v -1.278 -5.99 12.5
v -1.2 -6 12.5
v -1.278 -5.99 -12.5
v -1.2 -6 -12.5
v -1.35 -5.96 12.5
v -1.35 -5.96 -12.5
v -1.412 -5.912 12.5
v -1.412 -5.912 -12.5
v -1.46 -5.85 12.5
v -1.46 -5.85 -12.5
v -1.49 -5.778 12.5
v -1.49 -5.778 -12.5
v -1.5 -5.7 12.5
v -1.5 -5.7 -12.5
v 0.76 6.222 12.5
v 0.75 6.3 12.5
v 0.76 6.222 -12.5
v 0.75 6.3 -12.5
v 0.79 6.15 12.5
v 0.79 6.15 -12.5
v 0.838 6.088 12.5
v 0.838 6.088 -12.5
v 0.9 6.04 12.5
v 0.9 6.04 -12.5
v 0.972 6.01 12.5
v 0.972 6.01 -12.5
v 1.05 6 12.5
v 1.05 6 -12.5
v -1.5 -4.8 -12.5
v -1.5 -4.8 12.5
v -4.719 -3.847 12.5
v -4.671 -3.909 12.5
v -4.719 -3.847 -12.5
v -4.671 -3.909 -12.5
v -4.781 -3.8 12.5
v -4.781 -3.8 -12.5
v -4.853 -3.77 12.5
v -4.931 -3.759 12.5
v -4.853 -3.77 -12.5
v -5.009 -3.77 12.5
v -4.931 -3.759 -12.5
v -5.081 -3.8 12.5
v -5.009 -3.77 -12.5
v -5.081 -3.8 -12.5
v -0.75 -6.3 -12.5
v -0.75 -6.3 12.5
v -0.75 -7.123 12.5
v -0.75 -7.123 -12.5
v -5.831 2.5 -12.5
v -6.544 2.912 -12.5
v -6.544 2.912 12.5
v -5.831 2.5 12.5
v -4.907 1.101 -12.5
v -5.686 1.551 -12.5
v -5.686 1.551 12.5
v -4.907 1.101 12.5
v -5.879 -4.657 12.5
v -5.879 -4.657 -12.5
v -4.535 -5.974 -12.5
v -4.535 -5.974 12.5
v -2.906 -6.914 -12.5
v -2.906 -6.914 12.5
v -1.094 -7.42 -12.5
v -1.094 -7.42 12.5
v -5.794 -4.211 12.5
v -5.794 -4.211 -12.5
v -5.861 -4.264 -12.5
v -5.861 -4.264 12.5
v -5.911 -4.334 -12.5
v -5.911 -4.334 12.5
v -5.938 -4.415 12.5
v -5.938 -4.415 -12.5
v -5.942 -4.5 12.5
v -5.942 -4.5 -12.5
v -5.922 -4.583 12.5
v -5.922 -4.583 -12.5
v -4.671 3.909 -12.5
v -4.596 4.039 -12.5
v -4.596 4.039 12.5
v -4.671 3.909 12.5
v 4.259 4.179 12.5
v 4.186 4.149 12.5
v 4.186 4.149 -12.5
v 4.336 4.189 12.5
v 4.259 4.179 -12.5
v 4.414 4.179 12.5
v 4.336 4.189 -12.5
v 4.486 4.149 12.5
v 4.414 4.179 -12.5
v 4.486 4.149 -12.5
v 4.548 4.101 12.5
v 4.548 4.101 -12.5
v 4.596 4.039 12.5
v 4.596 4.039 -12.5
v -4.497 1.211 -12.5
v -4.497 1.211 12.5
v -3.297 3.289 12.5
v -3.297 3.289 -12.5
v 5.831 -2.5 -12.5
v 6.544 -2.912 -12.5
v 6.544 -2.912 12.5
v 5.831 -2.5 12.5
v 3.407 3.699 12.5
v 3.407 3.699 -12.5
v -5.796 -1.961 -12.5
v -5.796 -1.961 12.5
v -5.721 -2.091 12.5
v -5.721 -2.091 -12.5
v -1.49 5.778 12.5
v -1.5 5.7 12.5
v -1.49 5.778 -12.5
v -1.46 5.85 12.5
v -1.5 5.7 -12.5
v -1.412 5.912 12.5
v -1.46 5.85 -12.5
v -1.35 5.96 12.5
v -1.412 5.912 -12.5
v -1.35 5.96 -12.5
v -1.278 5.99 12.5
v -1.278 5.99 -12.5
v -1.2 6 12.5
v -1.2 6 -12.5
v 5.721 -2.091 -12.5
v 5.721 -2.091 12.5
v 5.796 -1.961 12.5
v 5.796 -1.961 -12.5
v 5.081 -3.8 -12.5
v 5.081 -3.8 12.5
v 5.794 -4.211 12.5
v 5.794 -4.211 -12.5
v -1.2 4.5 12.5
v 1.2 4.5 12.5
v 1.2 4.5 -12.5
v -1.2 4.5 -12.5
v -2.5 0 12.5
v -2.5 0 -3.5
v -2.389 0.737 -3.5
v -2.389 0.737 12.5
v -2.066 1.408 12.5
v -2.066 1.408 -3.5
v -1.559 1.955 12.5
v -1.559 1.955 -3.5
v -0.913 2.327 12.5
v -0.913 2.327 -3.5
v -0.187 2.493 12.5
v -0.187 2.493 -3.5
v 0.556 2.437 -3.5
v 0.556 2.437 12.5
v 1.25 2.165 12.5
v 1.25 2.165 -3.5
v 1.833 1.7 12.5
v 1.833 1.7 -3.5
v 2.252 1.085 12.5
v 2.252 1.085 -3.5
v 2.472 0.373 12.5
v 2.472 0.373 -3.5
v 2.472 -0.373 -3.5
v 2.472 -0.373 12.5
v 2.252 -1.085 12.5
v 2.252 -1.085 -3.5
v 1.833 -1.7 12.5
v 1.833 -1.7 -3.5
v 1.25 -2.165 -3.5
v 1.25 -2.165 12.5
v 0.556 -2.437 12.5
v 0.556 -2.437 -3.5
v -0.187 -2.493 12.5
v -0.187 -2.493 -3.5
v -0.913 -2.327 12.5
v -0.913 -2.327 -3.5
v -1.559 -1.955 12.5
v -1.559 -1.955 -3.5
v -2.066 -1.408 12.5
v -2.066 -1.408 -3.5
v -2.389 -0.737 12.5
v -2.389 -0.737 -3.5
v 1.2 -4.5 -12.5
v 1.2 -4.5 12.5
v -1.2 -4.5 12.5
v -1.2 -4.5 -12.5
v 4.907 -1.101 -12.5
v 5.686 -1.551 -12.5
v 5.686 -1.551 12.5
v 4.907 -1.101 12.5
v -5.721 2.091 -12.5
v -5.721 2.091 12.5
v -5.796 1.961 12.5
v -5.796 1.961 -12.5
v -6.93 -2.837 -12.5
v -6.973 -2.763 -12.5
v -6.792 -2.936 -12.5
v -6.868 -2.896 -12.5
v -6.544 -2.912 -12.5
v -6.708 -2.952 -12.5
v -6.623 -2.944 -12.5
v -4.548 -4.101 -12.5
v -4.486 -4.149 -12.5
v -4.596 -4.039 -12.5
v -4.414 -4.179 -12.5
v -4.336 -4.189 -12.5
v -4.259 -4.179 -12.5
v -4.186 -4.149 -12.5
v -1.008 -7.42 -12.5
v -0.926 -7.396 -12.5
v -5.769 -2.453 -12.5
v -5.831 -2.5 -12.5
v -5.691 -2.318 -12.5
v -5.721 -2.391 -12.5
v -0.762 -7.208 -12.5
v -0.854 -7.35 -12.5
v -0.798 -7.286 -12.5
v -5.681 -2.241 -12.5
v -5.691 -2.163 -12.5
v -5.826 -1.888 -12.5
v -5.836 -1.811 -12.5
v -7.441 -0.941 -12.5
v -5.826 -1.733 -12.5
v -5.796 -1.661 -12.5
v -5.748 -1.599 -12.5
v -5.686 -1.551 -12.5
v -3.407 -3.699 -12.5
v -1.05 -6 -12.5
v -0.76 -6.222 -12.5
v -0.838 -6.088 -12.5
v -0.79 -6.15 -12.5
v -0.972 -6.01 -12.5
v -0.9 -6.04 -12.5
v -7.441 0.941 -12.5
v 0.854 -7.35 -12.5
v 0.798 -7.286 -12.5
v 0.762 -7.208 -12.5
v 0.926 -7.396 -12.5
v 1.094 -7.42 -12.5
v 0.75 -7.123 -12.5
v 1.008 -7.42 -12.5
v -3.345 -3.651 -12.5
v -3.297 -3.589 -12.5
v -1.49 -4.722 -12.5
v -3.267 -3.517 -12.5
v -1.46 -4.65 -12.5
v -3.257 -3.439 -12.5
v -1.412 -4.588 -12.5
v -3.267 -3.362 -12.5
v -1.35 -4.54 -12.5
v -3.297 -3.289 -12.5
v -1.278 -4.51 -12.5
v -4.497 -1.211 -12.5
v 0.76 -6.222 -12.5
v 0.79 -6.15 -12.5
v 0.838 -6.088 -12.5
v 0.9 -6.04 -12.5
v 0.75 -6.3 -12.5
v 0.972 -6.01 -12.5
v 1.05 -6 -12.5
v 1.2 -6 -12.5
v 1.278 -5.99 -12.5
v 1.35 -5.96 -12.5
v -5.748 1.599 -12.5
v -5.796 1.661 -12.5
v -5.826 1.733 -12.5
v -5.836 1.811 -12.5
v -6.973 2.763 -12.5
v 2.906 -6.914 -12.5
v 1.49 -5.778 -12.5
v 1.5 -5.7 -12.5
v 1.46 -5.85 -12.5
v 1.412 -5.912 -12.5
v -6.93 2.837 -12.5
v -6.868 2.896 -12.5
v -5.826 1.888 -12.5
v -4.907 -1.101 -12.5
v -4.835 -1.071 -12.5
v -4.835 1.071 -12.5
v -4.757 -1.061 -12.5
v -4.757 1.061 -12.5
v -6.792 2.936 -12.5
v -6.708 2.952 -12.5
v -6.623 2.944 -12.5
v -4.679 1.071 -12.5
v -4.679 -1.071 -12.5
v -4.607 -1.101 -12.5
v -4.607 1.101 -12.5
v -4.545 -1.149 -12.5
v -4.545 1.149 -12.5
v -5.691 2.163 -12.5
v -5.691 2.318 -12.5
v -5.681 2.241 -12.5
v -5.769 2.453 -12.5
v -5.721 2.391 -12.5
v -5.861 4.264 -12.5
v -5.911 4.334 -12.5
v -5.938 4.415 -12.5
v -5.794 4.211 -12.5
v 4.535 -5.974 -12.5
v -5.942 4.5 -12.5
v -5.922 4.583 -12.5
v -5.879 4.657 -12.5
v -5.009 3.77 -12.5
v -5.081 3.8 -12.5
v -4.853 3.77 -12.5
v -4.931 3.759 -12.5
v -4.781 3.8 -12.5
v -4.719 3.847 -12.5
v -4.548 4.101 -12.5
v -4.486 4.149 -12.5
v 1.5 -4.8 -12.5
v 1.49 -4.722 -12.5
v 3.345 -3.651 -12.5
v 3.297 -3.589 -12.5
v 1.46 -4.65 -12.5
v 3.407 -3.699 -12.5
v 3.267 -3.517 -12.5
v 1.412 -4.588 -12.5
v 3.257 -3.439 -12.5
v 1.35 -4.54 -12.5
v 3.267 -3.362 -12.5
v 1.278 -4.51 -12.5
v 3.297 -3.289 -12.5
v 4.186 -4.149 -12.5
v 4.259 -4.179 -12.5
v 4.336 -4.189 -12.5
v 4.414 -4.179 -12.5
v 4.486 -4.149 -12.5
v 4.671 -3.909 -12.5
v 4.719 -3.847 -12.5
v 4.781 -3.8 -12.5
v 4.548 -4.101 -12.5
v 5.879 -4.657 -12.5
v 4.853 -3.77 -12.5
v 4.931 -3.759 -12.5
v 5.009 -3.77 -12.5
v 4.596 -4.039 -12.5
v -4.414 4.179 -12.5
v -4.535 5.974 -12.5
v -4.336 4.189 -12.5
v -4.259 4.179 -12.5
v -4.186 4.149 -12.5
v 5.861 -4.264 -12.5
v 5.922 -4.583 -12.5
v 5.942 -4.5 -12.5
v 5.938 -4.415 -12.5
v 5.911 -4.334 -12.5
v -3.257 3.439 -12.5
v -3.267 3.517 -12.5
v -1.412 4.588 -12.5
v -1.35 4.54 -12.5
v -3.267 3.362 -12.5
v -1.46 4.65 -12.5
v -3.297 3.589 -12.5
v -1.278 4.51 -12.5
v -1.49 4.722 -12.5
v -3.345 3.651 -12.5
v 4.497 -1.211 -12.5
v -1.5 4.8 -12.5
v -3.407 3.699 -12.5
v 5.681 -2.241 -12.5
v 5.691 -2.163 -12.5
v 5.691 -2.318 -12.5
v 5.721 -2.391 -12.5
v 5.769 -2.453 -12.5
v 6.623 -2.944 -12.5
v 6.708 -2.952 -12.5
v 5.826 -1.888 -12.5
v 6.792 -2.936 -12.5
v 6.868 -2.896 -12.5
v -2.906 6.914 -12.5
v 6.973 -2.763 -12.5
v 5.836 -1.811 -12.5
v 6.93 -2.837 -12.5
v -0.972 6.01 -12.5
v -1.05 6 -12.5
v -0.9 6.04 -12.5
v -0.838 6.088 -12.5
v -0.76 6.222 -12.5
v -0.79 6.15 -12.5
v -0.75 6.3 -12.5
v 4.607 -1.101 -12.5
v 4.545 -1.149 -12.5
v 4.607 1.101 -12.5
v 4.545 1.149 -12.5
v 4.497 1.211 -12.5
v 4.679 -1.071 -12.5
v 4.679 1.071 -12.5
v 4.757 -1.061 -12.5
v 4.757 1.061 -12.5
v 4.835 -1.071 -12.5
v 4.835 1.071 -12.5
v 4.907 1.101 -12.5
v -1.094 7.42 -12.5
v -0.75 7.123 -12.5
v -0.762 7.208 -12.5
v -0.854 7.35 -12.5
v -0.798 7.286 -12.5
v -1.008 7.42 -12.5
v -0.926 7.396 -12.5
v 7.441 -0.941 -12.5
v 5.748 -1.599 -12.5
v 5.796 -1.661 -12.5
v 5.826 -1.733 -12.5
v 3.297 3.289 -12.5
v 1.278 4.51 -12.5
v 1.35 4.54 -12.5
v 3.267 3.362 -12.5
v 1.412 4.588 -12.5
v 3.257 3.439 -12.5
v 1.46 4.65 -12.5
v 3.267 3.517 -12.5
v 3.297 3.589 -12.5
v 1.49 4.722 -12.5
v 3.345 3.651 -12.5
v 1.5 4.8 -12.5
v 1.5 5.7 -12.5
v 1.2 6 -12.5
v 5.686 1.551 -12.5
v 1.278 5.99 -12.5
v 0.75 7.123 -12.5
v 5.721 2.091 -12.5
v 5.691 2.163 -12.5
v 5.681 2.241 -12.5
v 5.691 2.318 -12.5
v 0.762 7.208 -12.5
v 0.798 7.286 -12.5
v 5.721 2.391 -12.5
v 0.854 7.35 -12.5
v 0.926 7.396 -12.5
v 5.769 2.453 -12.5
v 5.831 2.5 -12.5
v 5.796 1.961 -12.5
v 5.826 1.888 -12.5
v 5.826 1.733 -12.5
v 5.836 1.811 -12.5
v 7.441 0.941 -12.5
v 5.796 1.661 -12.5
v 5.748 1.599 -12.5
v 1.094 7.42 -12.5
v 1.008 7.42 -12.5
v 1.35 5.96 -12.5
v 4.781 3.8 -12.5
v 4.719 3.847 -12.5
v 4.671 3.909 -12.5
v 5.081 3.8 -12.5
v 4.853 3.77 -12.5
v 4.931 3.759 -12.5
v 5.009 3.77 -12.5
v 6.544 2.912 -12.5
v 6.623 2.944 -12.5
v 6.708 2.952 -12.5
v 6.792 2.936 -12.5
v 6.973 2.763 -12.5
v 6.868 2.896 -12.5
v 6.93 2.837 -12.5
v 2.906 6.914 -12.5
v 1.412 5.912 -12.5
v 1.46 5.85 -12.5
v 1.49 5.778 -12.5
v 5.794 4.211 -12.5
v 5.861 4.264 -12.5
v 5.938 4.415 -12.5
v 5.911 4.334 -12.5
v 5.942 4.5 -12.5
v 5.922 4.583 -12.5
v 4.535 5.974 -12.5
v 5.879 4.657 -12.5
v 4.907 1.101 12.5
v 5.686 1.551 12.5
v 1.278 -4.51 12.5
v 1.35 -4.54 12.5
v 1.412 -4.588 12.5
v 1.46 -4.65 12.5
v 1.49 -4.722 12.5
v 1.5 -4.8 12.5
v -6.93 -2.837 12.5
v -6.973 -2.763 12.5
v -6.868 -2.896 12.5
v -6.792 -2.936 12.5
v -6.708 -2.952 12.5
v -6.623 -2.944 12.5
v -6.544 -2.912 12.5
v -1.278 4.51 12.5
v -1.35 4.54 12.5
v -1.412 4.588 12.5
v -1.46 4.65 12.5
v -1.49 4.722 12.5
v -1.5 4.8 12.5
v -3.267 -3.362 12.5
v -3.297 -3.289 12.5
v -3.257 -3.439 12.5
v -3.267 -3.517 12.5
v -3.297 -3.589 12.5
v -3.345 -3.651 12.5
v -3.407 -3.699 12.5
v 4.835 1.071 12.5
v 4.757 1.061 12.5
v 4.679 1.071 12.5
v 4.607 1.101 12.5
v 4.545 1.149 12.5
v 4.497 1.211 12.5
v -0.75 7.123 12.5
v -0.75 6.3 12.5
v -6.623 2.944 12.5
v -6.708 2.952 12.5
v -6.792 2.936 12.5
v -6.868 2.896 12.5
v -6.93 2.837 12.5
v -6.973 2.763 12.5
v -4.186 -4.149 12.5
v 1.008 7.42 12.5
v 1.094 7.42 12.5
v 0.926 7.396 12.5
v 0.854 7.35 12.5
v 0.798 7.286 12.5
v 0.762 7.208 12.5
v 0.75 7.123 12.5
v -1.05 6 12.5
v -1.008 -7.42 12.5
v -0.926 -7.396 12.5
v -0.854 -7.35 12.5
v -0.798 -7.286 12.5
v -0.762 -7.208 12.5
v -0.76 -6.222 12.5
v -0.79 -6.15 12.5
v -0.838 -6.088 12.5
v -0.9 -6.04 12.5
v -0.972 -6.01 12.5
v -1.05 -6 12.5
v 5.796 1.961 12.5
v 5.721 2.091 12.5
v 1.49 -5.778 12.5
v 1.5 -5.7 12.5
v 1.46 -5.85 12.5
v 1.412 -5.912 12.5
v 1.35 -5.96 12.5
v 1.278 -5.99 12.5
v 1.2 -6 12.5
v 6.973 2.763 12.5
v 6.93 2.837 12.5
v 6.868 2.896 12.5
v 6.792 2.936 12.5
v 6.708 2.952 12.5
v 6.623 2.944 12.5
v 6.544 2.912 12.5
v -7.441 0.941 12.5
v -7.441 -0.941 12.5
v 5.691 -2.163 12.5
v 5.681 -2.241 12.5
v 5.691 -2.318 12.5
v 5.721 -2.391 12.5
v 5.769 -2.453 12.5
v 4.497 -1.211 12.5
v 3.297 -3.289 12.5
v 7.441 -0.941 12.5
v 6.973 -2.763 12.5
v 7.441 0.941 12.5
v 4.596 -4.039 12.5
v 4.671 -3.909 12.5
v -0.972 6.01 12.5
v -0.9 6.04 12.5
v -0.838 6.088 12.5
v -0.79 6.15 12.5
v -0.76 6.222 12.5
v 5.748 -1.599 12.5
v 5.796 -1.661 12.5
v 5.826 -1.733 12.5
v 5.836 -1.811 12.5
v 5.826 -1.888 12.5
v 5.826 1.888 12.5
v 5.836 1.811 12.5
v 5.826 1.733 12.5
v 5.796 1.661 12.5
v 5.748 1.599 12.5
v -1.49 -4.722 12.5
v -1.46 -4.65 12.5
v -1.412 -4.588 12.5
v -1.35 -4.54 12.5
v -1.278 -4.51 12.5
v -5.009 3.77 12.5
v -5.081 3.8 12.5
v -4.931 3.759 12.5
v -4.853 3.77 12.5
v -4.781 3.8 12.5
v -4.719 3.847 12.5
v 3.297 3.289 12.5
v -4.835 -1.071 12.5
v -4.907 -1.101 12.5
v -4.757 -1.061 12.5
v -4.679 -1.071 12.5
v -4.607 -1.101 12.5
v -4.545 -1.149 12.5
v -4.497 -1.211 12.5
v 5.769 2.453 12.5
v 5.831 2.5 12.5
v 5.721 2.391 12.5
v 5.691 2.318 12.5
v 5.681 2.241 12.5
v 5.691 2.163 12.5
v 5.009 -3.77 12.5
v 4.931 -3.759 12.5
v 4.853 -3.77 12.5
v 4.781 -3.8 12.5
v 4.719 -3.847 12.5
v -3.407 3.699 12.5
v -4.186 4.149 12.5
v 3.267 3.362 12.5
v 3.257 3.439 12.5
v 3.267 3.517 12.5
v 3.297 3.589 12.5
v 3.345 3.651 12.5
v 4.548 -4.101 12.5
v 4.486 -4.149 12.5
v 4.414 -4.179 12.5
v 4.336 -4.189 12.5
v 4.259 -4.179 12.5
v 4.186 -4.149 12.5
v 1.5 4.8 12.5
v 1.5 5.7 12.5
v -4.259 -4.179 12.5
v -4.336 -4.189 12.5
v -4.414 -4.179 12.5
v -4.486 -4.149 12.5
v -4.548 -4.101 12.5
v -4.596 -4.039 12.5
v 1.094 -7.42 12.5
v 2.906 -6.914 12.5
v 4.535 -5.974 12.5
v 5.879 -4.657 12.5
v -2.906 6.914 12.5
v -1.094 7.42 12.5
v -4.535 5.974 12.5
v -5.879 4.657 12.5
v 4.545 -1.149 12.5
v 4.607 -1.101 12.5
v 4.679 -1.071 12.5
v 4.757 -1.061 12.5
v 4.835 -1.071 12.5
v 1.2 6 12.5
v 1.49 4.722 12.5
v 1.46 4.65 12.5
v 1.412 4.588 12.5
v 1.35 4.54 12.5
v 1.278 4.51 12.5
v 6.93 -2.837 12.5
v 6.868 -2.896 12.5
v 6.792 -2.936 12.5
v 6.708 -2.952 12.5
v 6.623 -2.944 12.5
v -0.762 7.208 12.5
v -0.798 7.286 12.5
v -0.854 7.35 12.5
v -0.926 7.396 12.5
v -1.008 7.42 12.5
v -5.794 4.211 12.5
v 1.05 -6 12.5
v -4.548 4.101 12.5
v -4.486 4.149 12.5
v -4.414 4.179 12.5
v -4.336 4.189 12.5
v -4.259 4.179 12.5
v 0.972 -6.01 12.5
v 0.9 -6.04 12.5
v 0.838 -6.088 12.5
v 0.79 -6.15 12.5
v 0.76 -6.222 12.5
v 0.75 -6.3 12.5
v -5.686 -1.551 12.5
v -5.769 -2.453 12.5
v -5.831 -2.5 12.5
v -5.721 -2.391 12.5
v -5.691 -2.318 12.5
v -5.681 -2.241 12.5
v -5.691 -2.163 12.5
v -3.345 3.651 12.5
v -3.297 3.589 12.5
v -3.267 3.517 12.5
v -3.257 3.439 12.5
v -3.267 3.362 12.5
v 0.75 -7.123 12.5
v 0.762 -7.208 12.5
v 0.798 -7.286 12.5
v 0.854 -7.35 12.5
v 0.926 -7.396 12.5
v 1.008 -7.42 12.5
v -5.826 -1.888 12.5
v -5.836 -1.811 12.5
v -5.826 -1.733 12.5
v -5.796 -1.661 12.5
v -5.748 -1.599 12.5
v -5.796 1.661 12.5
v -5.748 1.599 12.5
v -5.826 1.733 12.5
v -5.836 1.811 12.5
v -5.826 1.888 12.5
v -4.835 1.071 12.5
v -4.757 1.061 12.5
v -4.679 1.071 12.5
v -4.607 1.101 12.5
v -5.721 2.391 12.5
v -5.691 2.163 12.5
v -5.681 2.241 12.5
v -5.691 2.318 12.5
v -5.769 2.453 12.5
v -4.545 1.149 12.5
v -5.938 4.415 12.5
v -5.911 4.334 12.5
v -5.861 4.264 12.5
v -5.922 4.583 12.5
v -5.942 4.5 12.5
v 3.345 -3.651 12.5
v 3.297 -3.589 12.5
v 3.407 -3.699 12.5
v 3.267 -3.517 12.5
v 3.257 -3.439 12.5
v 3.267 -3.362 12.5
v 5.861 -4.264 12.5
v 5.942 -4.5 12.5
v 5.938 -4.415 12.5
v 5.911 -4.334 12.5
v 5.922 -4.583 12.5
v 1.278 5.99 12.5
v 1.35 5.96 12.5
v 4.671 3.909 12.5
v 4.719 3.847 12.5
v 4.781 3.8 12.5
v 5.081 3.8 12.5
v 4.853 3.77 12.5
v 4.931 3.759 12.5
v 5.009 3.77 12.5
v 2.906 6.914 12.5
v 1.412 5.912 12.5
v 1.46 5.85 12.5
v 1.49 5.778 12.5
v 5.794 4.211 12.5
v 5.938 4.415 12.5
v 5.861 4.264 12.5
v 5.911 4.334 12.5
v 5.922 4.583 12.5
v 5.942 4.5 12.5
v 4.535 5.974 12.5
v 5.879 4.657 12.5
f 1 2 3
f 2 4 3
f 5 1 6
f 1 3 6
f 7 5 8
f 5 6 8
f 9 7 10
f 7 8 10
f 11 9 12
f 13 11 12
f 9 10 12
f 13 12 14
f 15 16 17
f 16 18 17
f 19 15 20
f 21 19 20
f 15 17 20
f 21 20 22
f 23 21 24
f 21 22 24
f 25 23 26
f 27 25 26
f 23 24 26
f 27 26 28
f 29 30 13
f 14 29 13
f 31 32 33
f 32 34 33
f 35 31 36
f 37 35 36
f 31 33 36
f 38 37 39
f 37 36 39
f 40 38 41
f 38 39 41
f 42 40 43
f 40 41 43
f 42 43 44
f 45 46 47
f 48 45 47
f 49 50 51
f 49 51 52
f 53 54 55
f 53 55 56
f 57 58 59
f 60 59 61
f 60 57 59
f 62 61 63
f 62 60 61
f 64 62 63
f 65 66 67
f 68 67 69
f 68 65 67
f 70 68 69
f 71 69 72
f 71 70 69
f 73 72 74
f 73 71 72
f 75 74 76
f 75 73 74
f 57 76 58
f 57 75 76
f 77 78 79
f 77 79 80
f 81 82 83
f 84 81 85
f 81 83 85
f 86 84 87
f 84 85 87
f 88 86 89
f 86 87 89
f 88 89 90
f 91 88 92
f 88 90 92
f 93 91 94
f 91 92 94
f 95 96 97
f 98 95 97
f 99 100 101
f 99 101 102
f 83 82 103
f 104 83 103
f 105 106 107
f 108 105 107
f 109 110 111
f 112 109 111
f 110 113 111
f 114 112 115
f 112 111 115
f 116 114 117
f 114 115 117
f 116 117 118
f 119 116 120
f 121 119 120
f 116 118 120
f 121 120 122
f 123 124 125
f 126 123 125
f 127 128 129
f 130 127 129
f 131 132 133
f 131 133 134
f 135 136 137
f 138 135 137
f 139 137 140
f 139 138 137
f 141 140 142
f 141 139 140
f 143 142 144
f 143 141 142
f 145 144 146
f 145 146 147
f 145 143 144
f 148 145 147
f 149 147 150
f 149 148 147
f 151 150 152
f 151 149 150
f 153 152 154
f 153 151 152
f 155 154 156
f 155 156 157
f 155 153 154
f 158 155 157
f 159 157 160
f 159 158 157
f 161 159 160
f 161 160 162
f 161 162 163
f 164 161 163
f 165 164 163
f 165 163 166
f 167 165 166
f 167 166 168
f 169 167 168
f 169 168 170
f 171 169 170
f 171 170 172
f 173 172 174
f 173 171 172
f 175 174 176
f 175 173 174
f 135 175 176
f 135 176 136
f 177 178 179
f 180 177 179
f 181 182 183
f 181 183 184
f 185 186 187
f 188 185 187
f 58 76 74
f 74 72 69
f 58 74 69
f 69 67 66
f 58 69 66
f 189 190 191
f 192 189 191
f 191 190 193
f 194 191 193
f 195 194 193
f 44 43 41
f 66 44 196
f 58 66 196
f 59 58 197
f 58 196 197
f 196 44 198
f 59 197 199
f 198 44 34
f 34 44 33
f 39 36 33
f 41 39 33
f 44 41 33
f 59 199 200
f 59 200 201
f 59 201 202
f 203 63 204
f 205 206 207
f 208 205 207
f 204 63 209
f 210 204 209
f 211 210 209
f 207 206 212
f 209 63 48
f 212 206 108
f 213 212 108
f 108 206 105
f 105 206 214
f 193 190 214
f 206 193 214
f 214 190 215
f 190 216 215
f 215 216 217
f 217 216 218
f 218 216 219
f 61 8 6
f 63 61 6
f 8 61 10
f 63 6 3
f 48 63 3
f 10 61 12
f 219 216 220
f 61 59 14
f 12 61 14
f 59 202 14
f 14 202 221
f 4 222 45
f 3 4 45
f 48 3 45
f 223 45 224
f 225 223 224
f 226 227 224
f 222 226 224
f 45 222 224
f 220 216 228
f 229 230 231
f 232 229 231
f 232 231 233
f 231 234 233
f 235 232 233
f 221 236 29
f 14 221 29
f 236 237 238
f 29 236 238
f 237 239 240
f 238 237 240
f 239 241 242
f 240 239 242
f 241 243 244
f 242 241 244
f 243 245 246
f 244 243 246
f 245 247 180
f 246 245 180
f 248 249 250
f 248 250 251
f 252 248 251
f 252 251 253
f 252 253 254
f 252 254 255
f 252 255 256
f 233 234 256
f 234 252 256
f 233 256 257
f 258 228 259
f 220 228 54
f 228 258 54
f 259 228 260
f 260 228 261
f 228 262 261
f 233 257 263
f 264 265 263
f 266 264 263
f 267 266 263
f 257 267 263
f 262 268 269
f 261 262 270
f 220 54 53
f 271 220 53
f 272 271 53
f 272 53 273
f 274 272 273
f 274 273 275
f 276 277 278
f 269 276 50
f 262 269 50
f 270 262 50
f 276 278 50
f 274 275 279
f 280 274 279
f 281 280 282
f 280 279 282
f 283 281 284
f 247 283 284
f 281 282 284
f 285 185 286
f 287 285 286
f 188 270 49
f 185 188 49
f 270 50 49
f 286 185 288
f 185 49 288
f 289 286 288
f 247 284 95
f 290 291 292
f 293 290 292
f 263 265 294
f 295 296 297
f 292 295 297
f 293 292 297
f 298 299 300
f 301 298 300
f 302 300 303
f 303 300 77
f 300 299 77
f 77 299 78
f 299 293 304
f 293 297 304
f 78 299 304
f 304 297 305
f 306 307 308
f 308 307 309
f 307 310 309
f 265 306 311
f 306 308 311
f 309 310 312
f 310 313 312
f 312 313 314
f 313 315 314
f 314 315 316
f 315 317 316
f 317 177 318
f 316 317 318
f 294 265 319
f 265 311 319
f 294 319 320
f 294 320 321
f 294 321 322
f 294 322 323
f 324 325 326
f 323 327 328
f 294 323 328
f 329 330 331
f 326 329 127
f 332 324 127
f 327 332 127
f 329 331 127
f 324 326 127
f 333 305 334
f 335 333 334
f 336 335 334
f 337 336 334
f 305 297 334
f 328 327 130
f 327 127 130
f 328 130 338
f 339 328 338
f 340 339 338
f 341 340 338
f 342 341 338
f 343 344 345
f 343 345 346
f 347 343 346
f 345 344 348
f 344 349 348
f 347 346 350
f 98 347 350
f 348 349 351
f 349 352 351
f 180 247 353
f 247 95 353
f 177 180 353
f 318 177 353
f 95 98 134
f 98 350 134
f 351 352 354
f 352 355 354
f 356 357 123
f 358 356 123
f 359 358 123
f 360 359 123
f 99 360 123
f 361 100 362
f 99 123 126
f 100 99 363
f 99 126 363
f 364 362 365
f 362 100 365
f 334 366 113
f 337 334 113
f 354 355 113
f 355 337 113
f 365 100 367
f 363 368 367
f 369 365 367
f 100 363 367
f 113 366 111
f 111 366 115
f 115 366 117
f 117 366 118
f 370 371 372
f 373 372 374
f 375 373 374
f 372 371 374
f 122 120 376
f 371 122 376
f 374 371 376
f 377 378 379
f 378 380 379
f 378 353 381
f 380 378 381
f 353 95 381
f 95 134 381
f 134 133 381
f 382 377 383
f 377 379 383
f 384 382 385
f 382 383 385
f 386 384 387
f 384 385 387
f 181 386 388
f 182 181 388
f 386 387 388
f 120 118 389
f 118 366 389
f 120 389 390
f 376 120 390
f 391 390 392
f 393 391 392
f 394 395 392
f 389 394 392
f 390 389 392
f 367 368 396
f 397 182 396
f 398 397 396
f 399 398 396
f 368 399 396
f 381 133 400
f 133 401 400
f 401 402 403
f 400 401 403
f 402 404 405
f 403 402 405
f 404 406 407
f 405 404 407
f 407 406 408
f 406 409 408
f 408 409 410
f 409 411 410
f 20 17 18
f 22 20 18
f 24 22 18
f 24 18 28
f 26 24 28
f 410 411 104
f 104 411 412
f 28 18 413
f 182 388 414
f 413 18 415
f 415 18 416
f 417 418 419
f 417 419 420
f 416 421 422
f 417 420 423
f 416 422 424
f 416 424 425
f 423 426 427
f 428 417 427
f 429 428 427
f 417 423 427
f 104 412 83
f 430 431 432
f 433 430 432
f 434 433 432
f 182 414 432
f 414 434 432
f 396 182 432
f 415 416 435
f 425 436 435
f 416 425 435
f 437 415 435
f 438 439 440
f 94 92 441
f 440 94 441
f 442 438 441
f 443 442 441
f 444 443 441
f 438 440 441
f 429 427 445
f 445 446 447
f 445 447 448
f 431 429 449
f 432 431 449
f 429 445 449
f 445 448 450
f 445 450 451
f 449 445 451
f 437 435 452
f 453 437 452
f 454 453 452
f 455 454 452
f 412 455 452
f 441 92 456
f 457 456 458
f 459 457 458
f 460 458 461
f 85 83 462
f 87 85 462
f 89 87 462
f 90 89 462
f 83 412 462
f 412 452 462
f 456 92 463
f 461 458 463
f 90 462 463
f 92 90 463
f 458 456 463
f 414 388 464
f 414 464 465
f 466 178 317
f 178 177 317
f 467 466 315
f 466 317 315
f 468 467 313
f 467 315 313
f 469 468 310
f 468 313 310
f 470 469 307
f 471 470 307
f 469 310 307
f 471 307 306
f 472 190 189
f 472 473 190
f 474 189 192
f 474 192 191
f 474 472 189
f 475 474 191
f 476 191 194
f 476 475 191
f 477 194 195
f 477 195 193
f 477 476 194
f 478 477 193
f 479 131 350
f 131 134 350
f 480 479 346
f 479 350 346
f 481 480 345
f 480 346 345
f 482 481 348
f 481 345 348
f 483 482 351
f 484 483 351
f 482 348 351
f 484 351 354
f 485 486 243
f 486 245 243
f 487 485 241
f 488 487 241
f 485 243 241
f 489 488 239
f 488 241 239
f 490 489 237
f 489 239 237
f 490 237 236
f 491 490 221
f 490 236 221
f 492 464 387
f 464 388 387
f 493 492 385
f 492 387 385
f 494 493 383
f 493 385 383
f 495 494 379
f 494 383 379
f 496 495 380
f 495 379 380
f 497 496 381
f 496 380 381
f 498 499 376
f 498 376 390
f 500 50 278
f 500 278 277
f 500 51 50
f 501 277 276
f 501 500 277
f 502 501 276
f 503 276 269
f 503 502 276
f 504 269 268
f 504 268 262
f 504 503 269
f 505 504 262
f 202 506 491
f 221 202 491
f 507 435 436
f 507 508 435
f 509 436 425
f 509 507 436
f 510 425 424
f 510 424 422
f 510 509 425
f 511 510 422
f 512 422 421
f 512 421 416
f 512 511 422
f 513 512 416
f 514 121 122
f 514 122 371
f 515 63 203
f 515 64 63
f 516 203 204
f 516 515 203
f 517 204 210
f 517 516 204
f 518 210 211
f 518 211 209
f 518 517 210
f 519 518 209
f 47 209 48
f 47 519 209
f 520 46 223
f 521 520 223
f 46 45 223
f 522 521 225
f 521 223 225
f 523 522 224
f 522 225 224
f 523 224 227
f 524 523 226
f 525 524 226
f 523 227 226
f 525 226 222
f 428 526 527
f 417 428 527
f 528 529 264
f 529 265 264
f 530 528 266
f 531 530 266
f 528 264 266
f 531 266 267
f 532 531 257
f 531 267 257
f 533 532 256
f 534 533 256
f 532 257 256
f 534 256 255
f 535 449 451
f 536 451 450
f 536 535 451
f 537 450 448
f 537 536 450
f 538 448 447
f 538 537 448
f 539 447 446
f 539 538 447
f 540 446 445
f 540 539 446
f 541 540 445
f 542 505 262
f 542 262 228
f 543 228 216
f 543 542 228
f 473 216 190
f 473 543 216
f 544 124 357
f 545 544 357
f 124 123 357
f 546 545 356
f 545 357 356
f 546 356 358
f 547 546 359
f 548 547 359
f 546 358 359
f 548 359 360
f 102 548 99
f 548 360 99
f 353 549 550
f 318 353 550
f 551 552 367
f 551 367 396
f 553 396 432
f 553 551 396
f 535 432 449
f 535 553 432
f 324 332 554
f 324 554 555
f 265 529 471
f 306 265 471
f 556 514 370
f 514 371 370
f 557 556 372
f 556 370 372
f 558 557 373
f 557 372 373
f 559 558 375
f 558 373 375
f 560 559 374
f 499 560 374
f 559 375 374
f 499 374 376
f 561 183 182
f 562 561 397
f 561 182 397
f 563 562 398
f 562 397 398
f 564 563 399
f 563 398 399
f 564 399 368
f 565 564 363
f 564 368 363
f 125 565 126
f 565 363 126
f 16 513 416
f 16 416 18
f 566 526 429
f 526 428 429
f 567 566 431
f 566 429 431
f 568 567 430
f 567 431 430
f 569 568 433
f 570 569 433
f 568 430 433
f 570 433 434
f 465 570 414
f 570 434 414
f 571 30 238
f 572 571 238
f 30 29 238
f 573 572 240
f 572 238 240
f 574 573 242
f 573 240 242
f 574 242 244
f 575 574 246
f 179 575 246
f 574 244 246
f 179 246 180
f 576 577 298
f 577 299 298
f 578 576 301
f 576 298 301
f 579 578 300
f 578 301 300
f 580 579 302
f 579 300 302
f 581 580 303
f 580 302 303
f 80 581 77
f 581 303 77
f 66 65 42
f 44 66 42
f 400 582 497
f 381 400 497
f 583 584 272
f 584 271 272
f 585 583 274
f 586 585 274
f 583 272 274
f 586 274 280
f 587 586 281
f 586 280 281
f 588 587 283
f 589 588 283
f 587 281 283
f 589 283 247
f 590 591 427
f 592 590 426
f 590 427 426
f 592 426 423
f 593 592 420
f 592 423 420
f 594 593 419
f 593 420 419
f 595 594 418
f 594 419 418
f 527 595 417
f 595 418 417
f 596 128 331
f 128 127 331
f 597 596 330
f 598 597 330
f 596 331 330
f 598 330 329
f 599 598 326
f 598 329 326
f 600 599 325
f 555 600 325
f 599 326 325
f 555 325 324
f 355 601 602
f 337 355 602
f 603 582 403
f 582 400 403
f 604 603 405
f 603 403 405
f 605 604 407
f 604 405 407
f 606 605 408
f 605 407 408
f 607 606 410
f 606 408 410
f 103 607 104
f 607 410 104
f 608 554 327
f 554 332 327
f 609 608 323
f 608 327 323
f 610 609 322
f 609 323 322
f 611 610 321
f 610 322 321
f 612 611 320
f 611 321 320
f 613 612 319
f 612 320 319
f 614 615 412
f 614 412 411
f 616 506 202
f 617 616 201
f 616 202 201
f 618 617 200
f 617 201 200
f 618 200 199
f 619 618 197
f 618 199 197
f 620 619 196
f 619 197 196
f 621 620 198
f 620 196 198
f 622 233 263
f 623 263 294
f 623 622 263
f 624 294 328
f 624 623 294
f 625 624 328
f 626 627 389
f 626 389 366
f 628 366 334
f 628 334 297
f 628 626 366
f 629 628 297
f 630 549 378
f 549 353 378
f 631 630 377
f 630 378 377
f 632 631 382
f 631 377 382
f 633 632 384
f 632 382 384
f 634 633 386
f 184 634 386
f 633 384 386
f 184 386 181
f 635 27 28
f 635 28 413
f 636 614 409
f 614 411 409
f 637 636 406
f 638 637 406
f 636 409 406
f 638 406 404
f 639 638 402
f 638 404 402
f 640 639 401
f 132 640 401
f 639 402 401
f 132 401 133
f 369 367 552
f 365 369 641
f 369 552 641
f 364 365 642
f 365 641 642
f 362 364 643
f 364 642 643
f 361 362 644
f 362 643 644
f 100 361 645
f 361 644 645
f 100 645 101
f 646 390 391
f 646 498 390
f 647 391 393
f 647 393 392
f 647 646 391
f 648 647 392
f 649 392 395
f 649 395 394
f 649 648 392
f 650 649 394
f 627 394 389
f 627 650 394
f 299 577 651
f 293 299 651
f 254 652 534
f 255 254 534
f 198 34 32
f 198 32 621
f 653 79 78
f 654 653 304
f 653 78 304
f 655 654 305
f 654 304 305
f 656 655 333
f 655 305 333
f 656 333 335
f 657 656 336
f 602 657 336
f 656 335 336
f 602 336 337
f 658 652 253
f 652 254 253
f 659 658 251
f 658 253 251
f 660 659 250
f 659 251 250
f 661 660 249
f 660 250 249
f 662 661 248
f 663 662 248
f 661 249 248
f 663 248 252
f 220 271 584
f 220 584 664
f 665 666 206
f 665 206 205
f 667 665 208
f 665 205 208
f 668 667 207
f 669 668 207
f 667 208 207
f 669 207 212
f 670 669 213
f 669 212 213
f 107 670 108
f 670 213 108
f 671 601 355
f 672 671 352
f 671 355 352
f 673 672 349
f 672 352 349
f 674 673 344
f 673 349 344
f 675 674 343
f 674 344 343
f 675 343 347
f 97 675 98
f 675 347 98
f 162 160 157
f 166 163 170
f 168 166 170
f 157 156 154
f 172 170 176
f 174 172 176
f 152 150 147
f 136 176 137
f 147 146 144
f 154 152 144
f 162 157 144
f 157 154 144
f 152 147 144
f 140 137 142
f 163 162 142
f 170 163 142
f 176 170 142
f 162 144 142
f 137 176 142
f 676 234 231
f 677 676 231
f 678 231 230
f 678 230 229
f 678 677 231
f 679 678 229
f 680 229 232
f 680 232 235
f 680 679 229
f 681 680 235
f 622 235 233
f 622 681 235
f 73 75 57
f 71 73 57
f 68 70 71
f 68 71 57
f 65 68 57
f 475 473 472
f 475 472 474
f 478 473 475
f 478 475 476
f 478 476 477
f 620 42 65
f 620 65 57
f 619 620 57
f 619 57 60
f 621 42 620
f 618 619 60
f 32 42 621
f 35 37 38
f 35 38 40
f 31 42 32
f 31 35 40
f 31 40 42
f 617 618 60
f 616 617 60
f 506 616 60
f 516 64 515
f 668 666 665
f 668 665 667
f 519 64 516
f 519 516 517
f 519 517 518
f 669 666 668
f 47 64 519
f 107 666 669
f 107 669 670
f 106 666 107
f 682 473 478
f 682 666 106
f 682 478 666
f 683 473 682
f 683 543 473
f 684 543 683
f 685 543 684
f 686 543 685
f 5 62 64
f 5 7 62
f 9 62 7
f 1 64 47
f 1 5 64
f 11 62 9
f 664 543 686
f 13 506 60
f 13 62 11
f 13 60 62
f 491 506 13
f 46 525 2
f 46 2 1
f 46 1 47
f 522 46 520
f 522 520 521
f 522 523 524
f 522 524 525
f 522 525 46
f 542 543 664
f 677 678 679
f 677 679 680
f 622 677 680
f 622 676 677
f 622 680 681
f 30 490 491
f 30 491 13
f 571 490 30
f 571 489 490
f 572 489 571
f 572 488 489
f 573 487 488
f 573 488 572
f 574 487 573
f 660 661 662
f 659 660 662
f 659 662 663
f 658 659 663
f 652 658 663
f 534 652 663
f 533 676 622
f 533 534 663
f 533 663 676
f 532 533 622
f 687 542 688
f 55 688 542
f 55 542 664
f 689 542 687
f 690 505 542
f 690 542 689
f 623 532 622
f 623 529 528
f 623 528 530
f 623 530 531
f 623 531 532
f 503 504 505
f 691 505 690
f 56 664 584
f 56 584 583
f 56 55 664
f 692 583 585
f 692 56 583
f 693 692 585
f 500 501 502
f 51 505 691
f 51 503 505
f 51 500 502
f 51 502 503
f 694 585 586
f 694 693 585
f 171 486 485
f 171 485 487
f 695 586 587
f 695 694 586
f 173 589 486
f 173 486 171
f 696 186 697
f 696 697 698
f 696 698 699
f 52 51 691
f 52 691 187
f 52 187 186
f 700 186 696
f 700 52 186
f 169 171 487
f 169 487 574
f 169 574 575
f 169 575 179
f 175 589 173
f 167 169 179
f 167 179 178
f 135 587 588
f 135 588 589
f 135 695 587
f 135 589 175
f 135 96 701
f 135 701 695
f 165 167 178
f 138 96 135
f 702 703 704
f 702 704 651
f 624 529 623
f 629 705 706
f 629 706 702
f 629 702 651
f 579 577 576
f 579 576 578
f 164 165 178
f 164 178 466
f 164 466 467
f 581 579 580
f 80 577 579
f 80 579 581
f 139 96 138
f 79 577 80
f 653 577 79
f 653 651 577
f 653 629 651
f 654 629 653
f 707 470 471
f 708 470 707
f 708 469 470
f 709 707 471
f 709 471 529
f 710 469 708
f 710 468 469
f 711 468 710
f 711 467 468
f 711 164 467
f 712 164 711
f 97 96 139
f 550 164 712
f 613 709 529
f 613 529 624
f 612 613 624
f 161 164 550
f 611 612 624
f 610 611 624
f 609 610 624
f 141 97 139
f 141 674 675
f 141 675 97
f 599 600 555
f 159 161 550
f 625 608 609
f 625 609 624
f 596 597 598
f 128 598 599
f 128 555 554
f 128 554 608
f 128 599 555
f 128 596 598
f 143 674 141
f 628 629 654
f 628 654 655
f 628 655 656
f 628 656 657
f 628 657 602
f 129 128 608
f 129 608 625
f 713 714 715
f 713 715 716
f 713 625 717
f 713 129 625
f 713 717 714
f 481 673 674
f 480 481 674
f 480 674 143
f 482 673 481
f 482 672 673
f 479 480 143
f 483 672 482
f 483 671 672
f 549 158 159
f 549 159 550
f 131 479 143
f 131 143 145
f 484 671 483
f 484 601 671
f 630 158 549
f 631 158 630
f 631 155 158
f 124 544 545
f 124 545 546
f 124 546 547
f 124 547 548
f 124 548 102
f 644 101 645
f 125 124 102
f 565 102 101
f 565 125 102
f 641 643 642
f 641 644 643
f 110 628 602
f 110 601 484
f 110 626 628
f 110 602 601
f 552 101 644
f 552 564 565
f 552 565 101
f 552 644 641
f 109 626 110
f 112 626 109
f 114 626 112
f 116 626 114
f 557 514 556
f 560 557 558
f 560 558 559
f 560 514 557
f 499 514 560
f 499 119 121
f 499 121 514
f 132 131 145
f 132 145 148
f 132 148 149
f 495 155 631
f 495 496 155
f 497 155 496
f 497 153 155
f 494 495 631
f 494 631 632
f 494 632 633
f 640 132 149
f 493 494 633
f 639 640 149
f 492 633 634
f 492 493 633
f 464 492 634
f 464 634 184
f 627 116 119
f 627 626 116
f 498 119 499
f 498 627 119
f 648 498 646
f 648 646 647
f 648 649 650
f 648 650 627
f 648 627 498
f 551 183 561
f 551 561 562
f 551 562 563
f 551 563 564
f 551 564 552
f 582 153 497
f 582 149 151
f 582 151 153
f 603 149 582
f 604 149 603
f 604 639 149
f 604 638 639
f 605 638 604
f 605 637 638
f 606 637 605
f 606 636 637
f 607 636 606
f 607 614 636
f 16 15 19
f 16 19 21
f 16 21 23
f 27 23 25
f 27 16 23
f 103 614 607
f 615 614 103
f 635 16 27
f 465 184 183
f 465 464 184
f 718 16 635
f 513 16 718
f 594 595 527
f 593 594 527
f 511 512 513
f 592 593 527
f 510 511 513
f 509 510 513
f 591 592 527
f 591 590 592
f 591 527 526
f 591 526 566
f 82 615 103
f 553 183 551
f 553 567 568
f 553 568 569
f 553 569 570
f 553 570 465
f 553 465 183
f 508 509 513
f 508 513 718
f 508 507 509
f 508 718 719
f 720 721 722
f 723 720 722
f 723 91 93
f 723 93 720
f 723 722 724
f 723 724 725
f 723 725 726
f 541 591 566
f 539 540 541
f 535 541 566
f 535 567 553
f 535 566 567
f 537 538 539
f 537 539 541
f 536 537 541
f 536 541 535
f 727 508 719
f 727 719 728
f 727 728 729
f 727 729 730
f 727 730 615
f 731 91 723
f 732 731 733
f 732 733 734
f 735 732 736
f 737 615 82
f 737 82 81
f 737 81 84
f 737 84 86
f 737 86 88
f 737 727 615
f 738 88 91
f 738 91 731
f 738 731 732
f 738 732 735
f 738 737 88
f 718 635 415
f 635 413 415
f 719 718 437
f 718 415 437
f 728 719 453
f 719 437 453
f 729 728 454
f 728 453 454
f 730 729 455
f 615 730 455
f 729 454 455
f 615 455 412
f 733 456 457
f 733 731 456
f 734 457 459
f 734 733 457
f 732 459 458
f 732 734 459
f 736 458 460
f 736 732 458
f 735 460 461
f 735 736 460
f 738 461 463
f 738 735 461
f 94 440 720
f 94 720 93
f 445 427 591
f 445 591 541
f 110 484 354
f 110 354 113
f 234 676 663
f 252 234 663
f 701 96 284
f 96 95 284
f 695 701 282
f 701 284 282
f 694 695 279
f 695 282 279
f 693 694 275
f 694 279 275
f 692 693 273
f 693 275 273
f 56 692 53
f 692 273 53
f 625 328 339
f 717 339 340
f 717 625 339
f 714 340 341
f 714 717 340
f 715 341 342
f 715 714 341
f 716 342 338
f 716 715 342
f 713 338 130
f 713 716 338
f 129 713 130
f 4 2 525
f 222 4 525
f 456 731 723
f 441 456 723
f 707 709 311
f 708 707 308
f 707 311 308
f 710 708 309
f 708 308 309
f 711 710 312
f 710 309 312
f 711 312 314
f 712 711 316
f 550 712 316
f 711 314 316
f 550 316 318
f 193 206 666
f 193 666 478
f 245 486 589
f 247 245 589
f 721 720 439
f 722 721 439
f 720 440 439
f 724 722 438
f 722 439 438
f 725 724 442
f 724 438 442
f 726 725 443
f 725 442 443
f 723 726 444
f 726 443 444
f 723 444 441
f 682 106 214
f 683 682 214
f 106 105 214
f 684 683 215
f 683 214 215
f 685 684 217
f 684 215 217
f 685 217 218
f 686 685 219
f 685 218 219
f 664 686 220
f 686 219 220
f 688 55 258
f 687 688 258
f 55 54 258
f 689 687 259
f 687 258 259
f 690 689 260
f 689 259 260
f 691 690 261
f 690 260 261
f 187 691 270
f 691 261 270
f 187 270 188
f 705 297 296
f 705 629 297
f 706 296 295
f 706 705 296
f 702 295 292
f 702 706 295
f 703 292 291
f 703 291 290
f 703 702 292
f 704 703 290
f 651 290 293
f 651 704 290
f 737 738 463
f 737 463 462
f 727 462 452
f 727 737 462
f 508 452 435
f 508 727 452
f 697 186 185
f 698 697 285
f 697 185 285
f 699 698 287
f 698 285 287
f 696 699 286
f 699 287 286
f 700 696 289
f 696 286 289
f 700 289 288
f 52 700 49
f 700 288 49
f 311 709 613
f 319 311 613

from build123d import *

# Parameters (mm, degrees)
ESBO_O1_R                = 7.5
RESSALTO_EXTRUS_O1_DEPTH = 12.5
ESBO_O7_R                = 2.5
CORTE_EXTRUS_O1_DEPTH    = 16
CORTE_EXTRUS_O2_DEPTH    = 28.156951228
FILETE2_R                = 0.3


with BuildPart() as part:
    # Esboço1 → Ressalto-extrusão1 (new, symmetric)
    with BuildSketch(Plane.XY):
        Circle(ESBO_O1_R)
    extrude(amount=RESSALTO_EXTRUS_O1_DEPTH, both=True)

    # Esboço7 → Corte-extrusão1 (cut)
    with BuildSketch(Plane(origin=(0, 0, 12.5), x_dir=(-1, 0, 0), z_dir=(0, 0, -1))):
        Circle(ESBO_O7_R)
    extrude(amount=CORTE_EXTRUS_O1_DEPTH, mode=Mode.SUBTRACT)

    # Esboço9 → Corte-extrusão2 (cut, through all)
    with BuildSketch(Plane.XY.offset(12.5)):
        Polygon((-0.75, 6), (-0.75, 7.5), (0.75, 7.5), (0.75, 6), (1.5, 6), (1.5, 4.5), (-1.5, 4.5), (-1.5, 6), align=None)
        Polygon((4.446152423, 4.299038106), (3.147114317, 3.549038106), (4.647114317, 0.950961894), (5.946152423, 1.700961894), (5.571152423, 2.350480947), (6.870190528, 3.100480947), (6.120190528, 4.399519053), (4.821152423, 3.649519053), align=None)
        Polygon((5.946152423, -1.700961894), (4.647114317, -0.950961894), (3.147114317, -3.549038106), (4.446152423, -4.299038106), (4.821152423, -3.649519053), (6.120190528, -4.399519053), (6.870190528, -3.100480947), (5.571152423, -2.350480947), align=None)
        Polygon((1.5, -6), (1.5, -4.5), (-1.5, -4.5), (-1.5, -6), (-0.75, -6), (-0.75, -7.5), (0.75, -7.5), (0.75, -6), align=None)
        Polygon((-4.446152423, -4.299038106), (-3.147114317, -3.549038106), (-4.647114317, -0.950961894), (-5.946152423, -1.700961894), (-5.571152423, -2.350480947), (-6.870190528, -3.100480947), (-6.120190528, -4.399519053), (-4.821152423, -3.649519053), align=None)
        Polygon((-5.946152423, 1.700961894), (-4.647114317, 0.950961894), (-3.147114317, 3.549038106), (-4.446152423, 4.299038106), (-4.821152423, 3.649519053), (-6.120190528, 4.399519053), (-6.870190528, 3.100480947), (-5.571152423, 2.350480947), align=None)
    extrude(amount=-CORTE_EXTRUS_O2_DEPTH, mode=Mode.SUBTRACT)

    # Filete2
    filete2_edges = [part.edges().sort_by_distance(p)[0] for p in [
        (-6.837632977, -3.081683836, 0),
        (-6.087632977, -4.380721942, 0),
        (-4.821152423, -3.649519053, 0),
        (-5.571152423, -2.350480947, 0),
        (-5.946152423, -1.700961894, 0),
        (-4.647114317, -0.950961894, 0),
        (-3.147114317, -3.549038106, 0),
        (-4.446152423, -4.299038106, 0),
        (-0.75, -7.462405778, 0),
        (0.75, -7.462405778, 0),
        (0.75, -6, 0),
        (-0.75, -6, 0),
        (-1.5, -6, 0),
        (-1.5, -4.5, 0),
        (1.5, -4.5, 0),
        (1.5, -6, 0),
        (6.087632977, -4.380721942, 0),
        (6.837632977, -3.081683836, 0),
        (5.571152423, -2.350480947, 0),
        (4.821152423, -3.649519053, 0),
        (4.446152423, -4.299038106, 0),
        (3.147114317, -3.549038106, 0),
        (4.647114317, -0.950961894, 0),
        (5.946152423, -1.700961894, 0),
        (6.837632977, 3.081683836, 0),
        (6.087632977, 4.380721942, 0),
        (4.821152423, 3.649519053, 0),
        (5.571152423, 2.350480947, 0),
        (5.946152423, 1.700961894, 0),
        (4.647114317, 0.950961894, 0),
        (3.147114317, 3.549038106, 0),
        (4.446152423, 4.299038106, 0),
        (0.75, 7.462405778, 0),
        (-0.75, 7.462405778, 0),
        (-0.75, 6, 0),
        (0.75, 6, 0),
        (1.5, 6, 0),
        (1.5, 4.5, 0),
        (-1.5, 4.5, 0),
        (-1.5, 6, 0),
        (-6.087632977, 4.380721942, 0),
        (-6.837632977, 3.081683836, 0),
        (-5.571152423, 2.350480947, 0),
        (-4.821152423, 3.649519053, 0),
        (-4.446152423, 4.299038106, 0),
        (-3.147114317, 3.549038106, 0),
        (-4.647114317, 0.950961894, 0),
        (-5.946152423, 1.700961894, 0),
    ]]
    fillet(filete2_edges, radius=FILETE2_R)


solid = part.part
